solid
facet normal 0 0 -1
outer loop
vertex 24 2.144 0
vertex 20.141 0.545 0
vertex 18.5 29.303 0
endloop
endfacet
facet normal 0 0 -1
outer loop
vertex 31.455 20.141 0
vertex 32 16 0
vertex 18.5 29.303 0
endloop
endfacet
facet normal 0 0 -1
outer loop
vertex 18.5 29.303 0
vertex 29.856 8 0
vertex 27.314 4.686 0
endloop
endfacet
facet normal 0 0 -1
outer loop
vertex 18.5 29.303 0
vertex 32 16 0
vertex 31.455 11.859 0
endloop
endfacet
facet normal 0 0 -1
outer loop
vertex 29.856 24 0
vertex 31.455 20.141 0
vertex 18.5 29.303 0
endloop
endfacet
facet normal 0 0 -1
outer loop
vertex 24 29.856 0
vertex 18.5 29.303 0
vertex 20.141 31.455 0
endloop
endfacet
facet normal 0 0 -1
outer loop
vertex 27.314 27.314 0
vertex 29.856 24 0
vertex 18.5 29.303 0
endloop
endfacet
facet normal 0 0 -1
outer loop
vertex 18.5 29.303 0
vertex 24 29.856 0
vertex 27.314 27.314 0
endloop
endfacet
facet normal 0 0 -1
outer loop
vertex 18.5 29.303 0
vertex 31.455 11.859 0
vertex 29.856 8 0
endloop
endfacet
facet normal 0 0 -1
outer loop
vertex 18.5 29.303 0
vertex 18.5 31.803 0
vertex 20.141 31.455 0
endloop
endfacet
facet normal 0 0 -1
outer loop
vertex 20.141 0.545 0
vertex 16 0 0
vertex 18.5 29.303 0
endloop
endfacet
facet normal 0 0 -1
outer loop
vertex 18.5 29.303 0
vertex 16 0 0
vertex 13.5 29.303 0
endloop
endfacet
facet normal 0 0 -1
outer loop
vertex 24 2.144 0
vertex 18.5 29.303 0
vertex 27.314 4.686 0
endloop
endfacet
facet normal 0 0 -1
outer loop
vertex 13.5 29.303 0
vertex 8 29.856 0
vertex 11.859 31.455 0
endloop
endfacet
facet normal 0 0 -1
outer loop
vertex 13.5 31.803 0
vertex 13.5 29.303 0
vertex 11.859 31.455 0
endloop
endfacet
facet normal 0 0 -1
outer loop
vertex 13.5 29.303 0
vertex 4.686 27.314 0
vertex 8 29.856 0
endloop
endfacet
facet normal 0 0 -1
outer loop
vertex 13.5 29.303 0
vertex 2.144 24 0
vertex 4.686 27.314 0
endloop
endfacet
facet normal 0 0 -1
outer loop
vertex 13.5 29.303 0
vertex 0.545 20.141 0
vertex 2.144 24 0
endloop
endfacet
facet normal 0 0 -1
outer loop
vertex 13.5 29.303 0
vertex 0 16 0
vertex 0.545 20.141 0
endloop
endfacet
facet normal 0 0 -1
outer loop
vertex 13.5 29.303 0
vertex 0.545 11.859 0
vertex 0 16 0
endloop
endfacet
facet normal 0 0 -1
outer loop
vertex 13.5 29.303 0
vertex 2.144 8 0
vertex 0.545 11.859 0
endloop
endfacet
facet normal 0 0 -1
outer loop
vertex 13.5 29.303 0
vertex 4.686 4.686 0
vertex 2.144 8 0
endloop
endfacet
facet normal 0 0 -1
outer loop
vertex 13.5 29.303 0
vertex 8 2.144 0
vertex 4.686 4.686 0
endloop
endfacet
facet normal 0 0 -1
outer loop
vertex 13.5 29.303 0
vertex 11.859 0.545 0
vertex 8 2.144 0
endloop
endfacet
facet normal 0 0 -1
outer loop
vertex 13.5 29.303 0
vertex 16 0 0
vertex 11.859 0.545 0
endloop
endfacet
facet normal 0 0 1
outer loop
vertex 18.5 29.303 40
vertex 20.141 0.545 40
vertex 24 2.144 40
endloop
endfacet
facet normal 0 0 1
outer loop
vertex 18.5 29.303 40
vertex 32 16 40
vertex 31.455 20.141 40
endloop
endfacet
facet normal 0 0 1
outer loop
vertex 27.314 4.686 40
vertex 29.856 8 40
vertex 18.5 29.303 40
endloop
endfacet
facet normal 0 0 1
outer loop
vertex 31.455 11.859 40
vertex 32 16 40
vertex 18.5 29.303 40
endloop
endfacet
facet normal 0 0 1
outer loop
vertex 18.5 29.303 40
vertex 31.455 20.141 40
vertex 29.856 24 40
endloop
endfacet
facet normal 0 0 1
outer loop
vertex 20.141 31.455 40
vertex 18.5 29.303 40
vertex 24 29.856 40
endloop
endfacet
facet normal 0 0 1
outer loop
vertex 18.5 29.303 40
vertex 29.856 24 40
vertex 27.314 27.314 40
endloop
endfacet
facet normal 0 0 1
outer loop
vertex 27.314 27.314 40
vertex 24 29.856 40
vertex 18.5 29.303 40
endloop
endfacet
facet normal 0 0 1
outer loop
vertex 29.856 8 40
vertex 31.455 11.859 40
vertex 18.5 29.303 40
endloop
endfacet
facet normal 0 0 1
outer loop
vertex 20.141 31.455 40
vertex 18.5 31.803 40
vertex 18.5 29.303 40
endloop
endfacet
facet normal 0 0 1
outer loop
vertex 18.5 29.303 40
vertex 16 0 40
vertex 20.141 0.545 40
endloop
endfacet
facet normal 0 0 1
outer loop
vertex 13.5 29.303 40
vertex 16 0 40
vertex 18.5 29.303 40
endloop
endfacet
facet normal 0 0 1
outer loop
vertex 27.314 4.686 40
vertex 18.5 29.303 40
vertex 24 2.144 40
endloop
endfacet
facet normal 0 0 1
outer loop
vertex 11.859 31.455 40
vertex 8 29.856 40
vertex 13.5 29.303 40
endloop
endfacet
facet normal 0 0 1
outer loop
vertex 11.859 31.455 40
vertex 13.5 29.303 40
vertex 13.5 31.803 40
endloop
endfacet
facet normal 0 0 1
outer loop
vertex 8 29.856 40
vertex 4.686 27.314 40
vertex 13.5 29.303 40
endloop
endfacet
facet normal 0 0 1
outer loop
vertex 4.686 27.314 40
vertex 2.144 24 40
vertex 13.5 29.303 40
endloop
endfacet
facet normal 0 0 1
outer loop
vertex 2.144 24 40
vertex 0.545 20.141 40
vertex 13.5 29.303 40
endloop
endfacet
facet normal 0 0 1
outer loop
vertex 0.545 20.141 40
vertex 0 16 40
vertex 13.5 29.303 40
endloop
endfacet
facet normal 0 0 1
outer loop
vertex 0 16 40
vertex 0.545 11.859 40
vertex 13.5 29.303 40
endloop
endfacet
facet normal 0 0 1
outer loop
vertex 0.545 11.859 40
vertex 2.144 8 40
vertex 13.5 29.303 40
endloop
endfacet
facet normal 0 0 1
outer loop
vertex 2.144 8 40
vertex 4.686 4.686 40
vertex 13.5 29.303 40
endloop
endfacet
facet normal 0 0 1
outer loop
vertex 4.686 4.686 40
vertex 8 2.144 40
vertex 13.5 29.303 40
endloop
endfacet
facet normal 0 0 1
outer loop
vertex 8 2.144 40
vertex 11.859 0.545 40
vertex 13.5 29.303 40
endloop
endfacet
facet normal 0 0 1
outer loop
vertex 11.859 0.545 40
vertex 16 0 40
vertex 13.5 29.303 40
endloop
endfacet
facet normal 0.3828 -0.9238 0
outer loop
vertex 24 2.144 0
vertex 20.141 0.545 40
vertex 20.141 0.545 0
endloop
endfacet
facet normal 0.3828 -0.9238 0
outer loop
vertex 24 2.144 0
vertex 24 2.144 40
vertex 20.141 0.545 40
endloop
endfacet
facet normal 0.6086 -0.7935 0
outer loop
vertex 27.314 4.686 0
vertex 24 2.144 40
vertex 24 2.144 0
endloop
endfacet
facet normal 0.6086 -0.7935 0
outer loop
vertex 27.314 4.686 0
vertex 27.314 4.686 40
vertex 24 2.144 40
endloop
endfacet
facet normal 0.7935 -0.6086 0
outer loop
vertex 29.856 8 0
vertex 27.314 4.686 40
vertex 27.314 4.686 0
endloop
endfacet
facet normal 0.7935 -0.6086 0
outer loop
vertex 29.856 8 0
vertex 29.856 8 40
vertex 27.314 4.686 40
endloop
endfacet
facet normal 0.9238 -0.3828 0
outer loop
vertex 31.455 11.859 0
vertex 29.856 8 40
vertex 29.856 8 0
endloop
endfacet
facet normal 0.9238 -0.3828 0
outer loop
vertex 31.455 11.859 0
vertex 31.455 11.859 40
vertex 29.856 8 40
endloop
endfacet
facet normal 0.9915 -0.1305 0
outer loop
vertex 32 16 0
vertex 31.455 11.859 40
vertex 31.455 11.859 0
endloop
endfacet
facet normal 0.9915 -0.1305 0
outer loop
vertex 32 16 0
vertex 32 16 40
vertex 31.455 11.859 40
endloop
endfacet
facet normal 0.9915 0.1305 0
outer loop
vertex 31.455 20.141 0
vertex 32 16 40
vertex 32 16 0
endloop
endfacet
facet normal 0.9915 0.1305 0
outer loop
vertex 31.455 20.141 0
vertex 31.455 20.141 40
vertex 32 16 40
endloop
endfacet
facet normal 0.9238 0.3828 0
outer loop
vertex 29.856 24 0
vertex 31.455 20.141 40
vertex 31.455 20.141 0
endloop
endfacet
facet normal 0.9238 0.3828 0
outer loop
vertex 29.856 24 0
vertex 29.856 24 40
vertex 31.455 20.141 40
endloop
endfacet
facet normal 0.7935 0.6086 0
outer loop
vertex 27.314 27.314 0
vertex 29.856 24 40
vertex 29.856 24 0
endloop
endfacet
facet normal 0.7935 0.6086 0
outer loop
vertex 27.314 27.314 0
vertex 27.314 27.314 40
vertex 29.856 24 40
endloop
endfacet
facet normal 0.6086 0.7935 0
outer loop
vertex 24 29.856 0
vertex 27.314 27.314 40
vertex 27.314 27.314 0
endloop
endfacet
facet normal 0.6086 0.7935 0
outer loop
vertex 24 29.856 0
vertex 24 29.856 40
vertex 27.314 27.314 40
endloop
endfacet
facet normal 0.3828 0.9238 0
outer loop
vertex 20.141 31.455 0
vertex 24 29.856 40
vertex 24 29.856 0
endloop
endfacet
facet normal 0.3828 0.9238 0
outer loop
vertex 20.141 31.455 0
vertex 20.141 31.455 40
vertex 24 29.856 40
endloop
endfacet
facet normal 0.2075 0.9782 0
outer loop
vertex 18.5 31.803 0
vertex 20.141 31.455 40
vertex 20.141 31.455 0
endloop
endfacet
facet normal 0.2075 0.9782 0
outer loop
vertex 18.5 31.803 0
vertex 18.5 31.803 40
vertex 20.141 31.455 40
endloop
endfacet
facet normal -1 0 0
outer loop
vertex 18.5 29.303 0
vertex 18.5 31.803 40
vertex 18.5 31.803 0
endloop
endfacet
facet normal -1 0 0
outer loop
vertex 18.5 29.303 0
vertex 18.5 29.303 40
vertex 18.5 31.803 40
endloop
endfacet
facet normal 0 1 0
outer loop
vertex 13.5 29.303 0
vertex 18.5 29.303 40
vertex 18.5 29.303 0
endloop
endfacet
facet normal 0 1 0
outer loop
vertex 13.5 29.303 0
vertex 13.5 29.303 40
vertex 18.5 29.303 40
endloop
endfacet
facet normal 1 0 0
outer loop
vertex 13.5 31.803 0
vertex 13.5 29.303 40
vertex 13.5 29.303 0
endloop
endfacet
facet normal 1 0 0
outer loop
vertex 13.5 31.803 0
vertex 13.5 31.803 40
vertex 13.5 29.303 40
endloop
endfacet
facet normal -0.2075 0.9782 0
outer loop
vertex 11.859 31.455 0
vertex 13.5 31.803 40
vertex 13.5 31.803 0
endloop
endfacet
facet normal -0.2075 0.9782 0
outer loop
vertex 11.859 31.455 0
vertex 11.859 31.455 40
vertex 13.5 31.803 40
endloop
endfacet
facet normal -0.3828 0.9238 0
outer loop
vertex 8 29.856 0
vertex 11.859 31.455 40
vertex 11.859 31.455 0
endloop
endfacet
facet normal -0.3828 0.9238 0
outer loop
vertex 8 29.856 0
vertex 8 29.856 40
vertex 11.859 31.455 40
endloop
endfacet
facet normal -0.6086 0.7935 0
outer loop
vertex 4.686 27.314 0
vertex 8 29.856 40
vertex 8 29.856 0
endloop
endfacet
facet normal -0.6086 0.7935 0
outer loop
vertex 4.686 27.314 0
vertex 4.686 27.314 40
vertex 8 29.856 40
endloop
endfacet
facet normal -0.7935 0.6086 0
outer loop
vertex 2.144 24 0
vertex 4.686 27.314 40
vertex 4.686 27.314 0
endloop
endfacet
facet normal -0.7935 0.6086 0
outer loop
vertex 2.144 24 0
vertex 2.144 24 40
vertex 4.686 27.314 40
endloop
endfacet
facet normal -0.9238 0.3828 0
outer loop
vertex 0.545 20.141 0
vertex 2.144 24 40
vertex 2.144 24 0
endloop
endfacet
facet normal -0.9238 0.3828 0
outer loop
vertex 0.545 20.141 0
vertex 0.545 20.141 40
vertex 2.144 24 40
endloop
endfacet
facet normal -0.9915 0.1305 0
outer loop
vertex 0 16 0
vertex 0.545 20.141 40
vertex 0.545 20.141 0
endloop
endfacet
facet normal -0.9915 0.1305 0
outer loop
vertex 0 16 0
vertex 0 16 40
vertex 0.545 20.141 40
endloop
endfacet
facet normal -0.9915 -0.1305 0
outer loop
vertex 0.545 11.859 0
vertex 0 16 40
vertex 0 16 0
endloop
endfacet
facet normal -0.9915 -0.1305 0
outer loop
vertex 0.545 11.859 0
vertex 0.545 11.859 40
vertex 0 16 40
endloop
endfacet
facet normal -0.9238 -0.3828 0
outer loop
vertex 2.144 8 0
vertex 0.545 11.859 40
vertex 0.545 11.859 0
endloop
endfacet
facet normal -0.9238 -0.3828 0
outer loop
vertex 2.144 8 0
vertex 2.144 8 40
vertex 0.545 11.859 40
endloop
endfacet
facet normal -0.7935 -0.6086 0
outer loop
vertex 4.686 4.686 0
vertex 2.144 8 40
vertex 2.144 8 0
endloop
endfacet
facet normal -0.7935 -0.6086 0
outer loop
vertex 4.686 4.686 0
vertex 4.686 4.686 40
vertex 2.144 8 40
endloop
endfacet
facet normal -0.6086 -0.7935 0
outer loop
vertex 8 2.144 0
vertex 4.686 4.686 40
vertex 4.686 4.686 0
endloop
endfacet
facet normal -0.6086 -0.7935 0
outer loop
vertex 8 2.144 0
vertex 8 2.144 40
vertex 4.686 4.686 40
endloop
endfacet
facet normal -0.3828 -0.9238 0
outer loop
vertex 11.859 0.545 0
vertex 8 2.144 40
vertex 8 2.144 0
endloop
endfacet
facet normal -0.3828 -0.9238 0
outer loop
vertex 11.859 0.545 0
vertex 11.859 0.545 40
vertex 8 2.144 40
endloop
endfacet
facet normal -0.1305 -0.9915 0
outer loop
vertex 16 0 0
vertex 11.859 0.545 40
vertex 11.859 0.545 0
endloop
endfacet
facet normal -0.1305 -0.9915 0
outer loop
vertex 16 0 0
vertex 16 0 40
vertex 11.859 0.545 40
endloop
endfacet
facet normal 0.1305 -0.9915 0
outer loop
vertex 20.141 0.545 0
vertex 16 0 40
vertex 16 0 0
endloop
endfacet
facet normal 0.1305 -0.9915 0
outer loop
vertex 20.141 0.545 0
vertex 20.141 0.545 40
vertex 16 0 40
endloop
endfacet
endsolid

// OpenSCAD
$fn = 32;

// ----------------------------------------------------------------------
// Keyway shaft: d32 shaft, key 5 x 2.5 mm
// ----------------------------------------------------------------------

// --- parameters (mm) ---
shaft_r = 16;             // shaft radius
key_w = 5;                // keyway width
key_d = 2.5;              // keyway depth below the surface line
plate_t = 40;             // shaft length, Z (extrusion height)

shaft_d = 2 * shaft_r;  // shaft diameter
circle_step = 15;  // polygon sampling step, degrees

profile = [[11.859, 31.455], [8, 29.856], [4.686, 27.314], [2.144, 24], [0.545, 20.141], [0, 16], [0.545, 11.859], [2.144, 8], [4.686, 4.686], [8, 2.144], [11.859, 0.545], [16, 0], [20.141, 0.545], [24, 2.144], [27.314, 4.686], [29.856, 8], [31.455, 11.859], [32, 16], [31.455, 20.141], [29.856, 24], [27.314, 27.314], [24, 29.856], [20.141, 31.455], [18.5, 31.803], [18.5, 29.303], [13.5, 29.303], [13.5, 31.803]];  // primary outline, 27 points, counter clockwise

// --- the one profile operation ---
linear_extrude(height = plate_t) polygon(points = profile);
